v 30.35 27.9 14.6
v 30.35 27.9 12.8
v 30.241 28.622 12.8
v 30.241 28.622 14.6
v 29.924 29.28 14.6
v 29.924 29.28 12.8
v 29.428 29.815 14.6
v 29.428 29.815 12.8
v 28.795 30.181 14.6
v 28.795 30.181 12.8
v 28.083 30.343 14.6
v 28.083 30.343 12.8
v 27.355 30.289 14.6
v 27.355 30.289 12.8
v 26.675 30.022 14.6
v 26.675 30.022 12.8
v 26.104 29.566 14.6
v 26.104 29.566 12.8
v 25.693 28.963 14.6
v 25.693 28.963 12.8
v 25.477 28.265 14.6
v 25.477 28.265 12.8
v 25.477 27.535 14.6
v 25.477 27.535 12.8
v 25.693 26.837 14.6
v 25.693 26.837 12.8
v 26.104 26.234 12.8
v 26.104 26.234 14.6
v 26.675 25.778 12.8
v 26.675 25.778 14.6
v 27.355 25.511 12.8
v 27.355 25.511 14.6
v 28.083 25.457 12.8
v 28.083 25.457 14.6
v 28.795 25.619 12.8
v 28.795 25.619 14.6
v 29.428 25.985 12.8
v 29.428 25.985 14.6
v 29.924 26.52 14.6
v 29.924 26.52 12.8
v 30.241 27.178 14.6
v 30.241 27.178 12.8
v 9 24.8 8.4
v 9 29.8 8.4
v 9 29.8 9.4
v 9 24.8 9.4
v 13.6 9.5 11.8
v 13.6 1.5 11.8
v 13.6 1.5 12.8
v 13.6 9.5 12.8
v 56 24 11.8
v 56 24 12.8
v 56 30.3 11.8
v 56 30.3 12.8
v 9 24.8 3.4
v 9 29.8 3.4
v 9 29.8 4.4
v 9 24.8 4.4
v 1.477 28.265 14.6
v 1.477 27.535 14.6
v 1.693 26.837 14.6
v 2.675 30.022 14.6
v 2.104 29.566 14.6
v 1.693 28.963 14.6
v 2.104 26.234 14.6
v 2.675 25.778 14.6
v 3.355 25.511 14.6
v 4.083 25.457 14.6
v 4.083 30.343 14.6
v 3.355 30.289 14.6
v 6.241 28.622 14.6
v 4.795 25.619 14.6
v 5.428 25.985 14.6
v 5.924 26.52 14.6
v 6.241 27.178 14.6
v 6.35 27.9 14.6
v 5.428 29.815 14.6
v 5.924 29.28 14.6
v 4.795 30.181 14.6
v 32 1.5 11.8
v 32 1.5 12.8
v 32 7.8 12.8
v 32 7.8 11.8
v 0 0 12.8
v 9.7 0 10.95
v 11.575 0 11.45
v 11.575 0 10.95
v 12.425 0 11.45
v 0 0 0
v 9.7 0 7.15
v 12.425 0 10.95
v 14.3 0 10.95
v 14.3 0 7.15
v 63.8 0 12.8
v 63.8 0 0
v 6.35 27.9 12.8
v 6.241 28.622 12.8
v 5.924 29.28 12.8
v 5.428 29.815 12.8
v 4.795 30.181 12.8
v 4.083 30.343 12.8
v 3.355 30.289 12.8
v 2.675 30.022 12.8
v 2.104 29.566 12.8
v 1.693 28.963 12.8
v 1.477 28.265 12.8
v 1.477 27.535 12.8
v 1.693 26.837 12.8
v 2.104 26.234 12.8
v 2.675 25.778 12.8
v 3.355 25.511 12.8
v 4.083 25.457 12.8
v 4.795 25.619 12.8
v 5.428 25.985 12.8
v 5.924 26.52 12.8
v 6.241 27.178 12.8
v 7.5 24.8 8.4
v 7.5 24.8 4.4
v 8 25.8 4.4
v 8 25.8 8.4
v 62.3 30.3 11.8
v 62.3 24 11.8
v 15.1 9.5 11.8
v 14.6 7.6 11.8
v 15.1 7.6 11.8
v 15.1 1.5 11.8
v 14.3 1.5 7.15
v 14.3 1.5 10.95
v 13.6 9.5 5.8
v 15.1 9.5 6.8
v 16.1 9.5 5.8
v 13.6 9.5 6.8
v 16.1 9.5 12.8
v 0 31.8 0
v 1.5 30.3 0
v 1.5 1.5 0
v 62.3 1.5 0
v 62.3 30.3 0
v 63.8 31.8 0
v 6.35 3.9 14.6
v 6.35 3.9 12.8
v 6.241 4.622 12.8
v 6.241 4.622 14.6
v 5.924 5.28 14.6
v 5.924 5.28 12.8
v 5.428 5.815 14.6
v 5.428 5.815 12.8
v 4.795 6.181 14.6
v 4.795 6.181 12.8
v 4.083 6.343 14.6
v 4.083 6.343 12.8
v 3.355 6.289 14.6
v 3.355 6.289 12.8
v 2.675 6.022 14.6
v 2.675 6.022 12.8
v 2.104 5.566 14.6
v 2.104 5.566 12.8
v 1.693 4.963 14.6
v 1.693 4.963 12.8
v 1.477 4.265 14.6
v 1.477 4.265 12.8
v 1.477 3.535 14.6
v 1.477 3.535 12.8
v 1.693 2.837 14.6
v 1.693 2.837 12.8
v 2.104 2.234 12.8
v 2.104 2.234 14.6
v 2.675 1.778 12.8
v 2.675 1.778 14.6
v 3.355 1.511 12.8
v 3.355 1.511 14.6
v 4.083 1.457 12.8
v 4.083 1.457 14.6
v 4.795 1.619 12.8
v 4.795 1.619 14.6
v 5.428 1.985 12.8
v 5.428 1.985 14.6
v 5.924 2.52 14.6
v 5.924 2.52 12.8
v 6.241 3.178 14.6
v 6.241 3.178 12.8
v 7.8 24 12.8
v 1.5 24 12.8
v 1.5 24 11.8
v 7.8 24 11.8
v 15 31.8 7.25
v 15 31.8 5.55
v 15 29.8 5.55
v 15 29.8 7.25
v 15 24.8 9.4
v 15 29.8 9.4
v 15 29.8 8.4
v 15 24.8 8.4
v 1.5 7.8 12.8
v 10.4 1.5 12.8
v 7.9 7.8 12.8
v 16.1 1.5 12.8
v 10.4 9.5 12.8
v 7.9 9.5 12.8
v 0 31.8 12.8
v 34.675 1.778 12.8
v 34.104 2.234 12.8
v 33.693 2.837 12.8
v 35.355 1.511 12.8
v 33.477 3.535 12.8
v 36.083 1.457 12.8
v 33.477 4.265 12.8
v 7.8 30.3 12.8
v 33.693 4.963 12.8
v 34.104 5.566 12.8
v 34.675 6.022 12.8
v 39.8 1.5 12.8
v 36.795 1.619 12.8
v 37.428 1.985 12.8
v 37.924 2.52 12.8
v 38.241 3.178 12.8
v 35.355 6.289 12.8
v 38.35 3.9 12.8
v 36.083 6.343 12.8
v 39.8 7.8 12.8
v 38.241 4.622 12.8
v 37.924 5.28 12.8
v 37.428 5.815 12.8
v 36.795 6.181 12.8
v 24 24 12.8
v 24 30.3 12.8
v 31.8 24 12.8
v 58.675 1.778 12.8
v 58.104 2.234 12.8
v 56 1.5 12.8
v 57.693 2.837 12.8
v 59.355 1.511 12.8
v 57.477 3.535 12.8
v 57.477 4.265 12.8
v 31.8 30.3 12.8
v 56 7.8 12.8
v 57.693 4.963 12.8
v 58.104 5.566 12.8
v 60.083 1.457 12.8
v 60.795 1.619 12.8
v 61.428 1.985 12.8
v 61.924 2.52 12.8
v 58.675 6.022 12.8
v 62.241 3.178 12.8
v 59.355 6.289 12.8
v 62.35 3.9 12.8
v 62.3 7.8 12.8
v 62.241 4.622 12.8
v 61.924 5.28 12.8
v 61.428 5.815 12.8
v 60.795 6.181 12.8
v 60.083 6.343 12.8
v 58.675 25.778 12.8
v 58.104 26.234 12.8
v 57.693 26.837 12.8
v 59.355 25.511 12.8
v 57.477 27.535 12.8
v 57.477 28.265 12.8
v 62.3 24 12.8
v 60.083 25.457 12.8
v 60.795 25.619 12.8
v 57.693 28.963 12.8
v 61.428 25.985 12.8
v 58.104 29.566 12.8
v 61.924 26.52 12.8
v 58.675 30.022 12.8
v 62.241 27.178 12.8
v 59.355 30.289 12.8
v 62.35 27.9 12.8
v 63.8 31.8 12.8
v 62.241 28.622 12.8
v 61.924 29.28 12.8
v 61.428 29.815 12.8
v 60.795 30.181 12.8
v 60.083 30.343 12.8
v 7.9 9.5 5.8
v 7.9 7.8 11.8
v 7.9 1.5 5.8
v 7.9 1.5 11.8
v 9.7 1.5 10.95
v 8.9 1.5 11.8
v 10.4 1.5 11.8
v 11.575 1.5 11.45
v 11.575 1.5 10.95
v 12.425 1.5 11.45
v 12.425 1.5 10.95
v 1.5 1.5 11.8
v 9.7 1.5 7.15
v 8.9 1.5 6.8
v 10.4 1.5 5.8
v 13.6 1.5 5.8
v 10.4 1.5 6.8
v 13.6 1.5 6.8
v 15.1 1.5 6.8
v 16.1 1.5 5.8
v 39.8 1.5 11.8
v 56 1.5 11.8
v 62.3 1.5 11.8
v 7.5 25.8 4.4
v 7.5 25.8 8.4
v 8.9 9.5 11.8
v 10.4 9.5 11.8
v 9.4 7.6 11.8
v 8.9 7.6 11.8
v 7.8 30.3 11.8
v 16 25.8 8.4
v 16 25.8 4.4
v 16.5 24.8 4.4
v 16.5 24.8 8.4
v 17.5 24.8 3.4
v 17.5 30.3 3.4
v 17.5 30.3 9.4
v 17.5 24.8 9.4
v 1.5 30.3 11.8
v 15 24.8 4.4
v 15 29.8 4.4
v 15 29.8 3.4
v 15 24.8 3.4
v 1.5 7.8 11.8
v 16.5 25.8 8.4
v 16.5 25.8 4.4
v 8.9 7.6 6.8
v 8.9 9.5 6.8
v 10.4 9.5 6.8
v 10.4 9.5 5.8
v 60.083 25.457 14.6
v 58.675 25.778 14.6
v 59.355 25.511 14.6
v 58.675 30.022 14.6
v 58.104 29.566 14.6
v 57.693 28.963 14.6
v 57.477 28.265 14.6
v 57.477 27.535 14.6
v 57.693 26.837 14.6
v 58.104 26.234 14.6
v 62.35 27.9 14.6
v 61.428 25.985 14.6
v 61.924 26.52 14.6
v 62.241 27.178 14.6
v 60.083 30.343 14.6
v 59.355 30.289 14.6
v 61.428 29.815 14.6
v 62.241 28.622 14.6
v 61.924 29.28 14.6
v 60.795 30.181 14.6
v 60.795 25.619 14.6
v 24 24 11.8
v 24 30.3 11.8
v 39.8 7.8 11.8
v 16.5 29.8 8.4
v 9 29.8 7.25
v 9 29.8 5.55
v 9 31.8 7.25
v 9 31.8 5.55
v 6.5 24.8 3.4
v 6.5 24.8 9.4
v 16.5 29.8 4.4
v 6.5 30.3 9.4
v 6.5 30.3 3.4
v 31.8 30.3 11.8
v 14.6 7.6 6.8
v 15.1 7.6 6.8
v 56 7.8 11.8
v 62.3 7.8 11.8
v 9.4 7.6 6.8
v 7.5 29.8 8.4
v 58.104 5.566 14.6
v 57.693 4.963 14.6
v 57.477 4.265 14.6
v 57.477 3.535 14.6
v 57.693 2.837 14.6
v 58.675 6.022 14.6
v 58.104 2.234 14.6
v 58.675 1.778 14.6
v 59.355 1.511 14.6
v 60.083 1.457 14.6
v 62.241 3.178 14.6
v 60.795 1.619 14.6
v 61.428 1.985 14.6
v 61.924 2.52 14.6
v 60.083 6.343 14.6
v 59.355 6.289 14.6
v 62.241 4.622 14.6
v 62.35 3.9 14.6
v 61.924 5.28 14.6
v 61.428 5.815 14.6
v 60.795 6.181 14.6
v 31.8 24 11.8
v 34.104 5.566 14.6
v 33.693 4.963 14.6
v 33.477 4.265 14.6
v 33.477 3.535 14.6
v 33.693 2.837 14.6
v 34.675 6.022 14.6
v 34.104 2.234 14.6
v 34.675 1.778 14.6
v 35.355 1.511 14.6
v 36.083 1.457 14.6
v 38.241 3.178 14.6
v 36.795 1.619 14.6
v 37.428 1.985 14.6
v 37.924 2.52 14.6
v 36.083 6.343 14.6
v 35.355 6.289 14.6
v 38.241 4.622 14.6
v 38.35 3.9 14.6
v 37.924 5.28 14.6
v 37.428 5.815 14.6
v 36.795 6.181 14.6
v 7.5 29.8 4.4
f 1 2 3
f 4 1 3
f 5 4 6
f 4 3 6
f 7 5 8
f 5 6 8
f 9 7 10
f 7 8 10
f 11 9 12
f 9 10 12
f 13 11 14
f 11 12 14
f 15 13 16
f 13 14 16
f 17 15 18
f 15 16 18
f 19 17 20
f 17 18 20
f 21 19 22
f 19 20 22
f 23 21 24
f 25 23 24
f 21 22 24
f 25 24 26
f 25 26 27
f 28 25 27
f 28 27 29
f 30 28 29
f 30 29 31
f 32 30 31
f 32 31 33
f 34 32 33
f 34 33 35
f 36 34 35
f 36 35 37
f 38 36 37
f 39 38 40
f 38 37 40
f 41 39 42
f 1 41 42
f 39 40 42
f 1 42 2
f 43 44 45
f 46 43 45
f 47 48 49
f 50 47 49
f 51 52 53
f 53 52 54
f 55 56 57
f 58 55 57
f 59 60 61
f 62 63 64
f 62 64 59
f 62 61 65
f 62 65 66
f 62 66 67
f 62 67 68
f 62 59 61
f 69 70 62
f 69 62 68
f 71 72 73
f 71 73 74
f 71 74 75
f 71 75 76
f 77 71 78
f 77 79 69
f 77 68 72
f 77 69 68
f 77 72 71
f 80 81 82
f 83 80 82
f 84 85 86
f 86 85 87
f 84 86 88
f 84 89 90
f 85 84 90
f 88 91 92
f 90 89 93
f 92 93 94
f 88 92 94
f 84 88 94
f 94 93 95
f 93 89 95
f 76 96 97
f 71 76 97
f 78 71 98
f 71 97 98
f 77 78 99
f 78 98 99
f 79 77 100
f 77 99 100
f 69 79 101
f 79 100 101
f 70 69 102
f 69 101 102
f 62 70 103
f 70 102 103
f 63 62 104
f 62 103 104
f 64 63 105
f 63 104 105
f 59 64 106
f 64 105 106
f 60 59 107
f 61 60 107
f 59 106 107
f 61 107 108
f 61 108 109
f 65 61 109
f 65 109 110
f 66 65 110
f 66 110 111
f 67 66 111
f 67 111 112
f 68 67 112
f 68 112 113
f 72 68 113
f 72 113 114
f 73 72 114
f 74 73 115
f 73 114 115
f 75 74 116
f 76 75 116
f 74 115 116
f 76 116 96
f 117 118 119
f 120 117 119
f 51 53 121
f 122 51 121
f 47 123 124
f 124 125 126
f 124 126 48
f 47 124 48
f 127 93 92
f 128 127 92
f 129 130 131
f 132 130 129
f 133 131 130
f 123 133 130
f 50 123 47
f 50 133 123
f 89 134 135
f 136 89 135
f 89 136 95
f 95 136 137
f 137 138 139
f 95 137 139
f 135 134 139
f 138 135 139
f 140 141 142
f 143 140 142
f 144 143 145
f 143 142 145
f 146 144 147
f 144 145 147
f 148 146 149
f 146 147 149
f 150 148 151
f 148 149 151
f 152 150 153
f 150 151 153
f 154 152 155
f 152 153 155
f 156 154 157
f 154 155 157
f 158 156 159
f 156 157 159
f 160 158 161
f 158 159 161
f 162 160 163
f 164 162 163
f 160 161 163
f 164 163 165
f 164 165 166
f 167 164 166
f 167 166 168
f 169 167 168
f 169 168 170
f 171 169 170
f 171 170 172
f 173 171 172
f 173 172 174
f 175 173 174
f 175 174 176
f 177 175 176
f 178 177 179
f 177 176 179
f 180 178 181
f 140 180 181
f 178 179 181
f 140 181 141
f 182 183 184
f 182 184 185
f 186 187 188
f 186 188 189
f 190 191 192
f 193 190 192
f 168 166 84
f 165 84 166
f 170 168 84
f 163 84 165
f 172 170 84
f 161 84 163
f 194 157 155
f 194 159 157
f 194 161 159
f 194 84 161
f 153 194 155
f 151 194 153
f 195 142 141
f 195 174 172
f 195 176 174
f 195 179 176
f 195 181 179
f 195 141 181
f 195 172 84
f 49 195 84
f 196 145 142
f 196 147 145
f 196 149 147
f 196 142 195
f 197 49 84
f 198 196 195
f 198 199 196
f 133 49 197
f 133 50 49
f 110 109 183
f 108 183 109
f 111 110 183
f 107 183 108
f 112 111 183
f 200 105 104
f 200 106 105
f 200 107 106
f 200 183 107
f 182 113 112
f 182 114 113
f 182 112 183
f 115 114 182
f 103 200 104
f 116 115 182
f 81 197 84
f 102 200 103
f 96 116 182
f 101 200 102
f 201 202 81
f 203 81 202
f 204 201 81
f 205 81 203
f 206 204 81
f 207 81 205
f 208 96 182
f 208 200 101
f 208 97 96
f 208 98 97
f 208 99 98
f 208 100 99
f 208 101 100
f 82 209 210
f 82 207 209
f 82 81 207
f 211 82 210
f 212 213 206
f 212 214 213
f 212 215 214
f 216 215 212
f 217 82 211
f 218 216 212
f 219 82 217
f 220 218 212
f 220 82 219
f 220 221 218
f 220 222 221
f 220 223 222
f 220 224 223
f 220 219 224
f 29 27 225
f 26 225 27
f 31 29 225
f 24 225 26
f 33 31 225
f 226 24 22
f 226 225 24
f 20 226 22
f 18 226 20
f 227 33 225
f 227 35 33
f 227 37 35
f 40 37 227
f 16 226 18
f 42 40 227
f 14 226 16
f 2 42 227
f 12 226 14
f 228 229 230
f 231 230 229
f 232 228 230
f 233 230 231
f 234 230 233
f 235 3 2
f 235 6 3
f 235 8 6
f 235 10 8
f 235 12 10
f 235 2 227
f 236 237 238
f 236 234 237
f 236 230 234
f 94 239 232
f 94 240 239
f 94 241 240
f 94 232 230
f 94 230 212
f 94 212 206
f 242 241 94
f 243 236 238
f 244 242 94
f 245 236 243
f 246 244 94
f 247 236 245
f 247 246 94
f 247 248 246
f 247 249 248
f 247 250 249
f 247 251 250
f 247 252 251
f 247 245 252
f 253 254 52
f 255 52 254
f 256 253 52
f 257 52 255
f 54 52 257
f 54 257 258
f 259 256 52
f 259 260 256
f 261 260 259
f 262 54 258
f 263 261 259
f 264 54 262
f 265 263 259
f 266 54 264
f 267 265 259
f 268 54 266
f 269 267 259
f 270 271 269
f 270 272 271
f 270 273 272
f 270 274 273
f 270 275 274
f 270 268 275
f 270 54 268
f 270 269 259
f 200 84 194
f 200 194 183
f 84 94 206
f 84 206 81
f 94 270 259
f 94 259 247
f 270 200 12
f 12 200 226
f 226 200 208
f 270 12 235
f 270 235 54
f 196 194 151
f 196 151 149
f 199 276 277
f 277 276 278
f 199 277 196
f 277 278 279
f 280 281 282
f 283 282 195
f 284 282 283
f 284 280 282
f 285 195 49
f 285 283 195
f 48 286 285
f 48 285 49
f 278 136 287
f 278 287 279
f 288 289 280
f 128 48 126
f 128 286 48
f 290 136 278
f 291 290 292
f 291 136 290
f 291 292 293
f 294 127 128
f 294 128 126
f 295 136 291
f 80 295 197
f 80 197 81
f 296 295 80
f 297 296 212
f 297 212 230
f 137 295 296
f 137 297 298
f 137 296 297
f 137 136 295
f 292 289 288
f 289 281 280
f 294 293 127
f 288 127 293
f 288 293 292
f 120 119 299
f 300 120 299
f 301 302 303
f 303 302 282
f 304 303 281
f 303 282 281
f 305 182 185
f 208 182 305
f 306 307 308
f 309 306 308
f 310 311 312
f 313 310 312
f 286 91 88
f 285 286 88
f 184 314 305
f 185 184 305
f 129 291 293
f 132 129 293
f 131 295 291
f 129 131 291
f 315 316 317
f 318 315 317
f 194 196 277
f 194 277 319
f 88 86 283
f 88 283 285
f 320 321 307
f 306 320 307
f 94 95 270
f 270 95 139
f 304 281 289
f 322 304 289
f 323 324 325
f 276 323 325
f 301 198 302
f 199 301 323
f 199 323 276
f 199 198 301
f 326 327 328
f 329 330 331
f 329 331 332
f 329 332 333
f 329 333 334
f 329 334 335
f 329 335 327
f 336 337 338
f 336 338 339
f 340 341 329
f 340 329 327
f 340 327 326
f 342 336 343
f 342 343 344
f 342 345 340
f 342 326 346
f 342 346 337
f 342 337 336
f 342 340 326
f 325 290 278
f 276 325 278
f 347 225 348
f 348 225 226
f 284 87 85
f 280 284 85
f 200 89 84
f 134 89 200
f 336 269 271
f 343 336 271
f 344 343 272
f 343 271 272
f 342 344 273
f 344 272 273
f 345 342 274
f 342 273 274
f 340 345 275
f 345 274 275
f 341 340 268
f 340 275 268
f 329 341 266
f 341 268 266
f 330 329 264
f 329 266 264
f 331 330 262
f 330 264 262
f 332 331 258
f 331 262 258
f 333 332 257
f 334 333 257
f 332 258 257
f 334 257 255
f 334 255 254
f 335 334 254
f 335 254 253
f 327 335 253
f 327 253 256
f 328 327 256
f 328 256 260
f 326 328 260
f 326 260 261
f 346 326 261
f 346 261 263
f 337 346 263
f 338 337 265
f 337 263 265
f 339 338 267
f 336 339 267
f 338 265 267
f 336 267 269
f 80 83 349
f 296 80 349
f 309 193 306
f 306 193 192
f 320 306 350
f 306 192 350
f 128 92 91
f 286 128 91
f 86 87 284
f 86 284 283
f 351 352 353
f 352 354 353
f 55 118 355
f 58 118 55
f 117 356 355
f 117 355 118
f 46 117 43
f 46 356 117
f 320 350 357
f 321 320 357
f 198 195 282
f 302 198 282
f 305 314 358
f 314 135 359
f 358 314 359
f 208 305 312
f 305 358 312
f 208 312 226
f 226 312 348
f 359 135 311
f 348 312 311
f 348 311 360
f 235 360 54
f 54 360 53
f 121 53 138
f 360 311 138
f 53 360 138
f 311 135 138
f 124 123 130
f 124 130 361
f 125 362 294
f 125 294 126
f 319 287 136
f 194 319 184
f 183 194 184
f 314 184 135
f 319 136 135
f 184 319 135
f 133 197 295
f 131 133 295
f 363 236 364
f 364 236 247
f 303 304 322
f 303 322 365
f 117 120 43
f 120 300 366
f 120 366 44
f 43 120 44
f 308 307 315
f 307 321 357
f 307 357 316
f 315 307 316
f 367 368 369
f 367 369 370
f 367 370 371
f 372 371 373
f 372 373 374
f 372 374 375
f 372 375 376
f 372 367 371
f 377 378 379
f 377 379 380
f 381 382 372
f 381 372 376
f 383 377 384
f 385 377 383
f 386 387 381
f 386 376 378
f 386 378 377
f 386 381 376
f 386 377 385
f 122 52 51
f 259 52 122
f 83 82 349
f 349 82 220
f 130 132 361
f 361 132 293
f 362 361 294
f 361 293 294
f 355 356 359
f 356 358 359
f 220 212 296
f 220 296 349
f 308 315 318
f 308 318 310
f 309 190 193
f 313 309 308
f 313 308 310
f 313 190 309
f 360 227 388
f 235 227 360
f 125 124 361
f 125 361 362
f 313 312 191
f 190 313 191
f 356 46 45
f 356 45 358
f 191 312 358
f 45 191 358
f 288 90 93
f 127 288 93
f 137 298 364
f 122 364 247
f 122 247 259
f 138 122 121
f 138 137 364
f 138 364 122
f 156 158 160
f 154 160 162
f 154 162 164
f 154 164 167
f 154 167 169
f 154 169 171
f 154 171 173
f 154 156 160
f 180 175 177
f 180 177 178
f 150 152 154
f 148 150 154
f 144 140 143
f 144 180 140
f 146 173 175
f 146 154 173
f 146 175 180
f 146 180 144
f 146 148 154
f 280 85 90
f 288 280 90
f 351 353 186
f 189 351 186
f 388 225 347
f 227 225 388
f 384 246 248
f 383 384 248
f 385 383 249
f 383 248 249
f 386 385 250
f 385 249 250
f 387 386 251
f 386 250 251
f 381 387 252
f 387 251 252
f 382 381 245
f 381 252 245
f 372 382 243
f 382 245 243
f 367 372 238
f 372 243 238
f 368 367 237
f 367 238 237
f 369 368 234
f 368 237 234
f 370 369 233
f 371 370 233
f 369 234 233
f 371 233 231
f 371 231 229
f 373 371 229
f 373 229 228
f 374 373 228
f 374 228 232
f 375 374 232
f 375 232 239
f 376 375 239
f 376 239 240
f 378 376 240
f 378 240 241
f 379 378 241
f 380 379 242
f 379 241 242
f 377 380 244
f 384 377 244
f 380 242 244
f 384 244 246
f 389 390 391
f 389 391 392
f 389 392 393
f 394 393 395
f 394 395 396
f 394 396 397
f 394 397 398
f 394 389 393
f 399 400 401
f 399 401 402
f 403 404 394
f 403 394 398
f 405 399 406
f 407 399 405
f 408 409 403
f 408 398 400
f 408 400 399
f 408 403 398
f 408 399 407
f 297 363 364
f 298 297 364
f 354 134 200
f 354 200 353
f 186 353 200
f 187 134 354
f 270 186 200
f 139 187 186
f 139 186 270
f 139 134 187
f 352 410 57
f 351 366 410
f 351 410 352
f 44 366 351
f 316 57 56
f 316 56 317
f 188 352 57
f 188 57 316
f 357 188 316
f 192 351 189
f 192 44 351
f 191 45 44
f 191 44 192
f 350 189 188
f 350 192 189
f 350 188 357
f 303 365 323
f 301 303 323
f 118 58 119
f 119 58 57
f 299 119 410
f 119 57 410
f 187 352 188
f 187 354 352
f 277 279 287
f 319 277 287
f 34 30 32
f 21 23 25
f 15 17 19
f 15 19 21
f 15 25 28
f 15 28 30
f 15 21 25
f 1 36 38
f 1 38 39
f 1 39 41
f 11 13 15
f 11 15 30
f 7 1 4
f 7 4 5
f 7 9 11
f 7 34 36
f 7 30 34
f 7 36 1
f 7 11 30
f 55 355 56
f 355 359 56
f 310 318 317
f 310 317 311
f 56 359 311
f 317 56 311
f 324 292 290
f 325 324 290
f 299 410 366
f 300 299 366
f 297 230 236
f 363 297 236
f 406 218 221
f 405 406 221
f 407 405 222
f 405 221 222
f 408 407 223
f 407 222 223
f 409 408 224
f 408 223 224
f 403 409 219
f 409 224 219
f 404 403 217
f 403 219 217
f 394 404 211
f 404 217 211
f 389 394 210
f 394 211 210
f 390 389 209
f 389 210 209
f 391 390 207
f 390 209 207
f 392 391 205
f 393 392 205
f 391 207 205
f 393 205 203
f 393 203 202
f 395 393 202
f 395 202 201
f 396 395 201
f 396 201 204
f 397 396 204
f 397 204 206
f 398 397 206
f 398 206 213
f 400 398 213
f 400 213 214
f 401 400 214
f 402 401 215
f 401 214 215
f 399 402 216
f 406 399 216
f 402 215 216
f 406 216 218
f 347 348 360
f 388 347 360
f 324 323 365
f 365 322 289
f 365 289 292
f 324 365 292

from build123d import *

# Parameters (mm, degrees)
F0_W      = 63.8
F0_H      = 31.8
F0_W_2    = 60.8
F0_H_2    = 28.8
F1_DEPTH  = 12.8
F2_W      = 6.3
F2_H      = 6.3
F2_W_2    = 7.8
F3_DEPTH  = 1
F4_R      = 2.45
F5_DEPTH  = 1.8
F6_W      = 0.85
F6_H      = 0.5
F7_DEPTH  = 25.4
F9_DEPTH  = 8
F11_DEPTH = 5
F12_W     = 0.1
F12_H     = 1
F13_DEPTH = 6.3
F14_W     = 6
F14_H     = 1.7
F15_DEPTH = 2.54
F16_W     = 11
F16_H     = 6
F16_W_2   = 6
F16_H_2   = 1.7
F17_DEPTH = 0.5
F19_DEPTH = 5
F21_DEPTH = 4


# Not quite as in the source:
# - a feature names something its author has since deleted; it is built from what else it names


with BuildPart() as f1:
    # F0 (on Top) → F1 (new body)
    with BuildSketch(Plane.XY):
        with Locations((31.9, 15.9)):
            Rectangle(F0_W, F0_H)
        with Locations((31.9, 15.9)):
            Rectangle(F0_W_2, F0_H_2, mode=Mode.SUBTRACT)
    extrude(amount=F1_DEPTH)

    # F2 (on face) → F3 (join)
    with BuildSketch(Plane.XY.offset(12.8)):
        with Locations((4.65, 27.15)):
            Rectangle(F2_W, F2_H)
        with Locations((4.65, 4.65)):
            Rectangle(F2_W, F2_H)
        with Locations((59.15, 4.65)):
            Rectangle(F2_W, F2_H)
        with Locations((59.15, 27.15)):
            Rectangle(F2_W, F2_H)
        with Locations((27.9, 27.15)):
            Rectangle(F2_W_2, F2_H)
        with Locations((35.9, 4.65)):
            Rectangle(F2_W_2, F2_H)
    extrude(amount=-F3_DEPTH)

    # F4 (on face) → F5 (join)
    with BuildSketch(Plane.XY.offset(12.8)):
        with Locations((3.9, 27.9)):
            Circle(F4_R)
        with Locations((59.9, 27.9)):
            Circle(F4_R)
        with Locations((59.9, 3.9)):
            Circle(F4_R)
        with Locations((3.9, 3.9)):
            Circle(F4_R)
        with Locations((27.9, 27.9)):
            Circle(F4_R)
        with Locations((35.9, 3.9)):
            Circle(F4_R)
    extrude(amount=F5_DEPTH)

    # F6 (on face) → F7 (cut)
    with BuildSketch(Plane.XZ):
        Polygon((11.575, 10.95), (9.7, 10.95), (9.7, 7.15), (14.3, 7.15), (14.3, 10.95), (12.425, 10.95), align=None)
        with Locations((12, 11.2)):
            Rectangle(F6_W, F6_H)
    extrude(amount=-F7_DEPTH, mode=Mode.SUBTRACT)

    # F8 (on face) → F9 (join)
    with BuildSketch(Plane(origin=(0, 1.5, 0), x_dir=(-1, 0, 0), z_dir=(0, 1, 0))):
        Polygon((-13.6, 5.8), (-13.6, 6.8), (-15.1, 6.8), (-15.1, 11.8), (-13.6, 11.8), (-13.6, 12.8), (-16.1, 12.8), (-16.1, 5.8), align=None)
        Polygon((-8.9, 6.8), (-10.4, 6.8), (-10.4, 5.8), (-7.9, 5.8), (-7.9, 12.8), (-10.4, 12.8), (-10.4, 11.8), (-8.9, 11.8), align=None)
    extrude(amount=F9_DEPTH)

    # F10 (on face) → F11 (join, through all)
    with BuildSketch(Plane.XY.offset(6.8)):
        Polygon((14.6, 7.6), (15.1, 7.6), (15.1, 9.5), align=None)
        Polygon((9.4, 7.6), (8.9, 9.5), (8.9, 7.6), align=None)
    extrude(amount=F11_DEPTH)

    # F12 (on face) → F13 (join, through all)
    with BuildSketch(Plane(origin=(0, 1.5, 0), x_dir=(-1, 0, 0), z_dir=(0, 1, 0))):
        with Locations((-7.85, 12.3)):
            Rectangle(F12_W, F12_H)
    extrude(amount=F13_DEPTH)

    # F14 (on face) → F15 (cut)
    with BuildSketch(Plane(origin=(0, 31.8, 0), x_dir=(-1, 0, 0), z_dir=(0, 1, 0))):
        with Locations((-12, 6.4)):
            Rectangle(F14_W, F14_H)
    extrude(amount=-F15_DEPTH, mode=Mode.SUBTRACT)

    # F16 (on face) → F17 (join)
    with BuildSketch(Plane.XZ.offset(-30.3)):
        with Locations((12, 6.4)):
            Rectangle(F16_W, F16_H)
        with Locations((12, 6.4)):
            Rectangle(F16_W_2, F16_H_2, mode=Mode.SUBTRACT)
    extrude(amount=F17_DEPTH)

    # F18 (on face) → F19 (join)
    with BuildSketch(Plane.XZ.offset(-29.8)):
        Polygon((9, 9.4), (6.5, 9.4), (6.5, 3.4), (9, 3.4), (9, 4.4), (7.5, 4.4), (7.5, 8.4), (9, 8.4), align=None)
        Polygon((17.5, 9.4), (15, 9.4), (15, 8.4), (16.5, 8.4), (16.5, 4.4), (15, 4.4), (15, 3.4), (17.5, 3.4), align=None)
    extrude(amount=F19_DEPTH)

    # F20 (on face) → F21 (join, through all)
    with BuildSketch(Plane.XY.offset(4.4)):
        Polygon((7.5, 25.8), (7.5, 24.8), (8, 25.8), align=None)
        Polygon((16, 25.8), (16.5, 24.8), (16.5, 25.8), align=None)
    extrude(amount=F21_DEPTH)


solid = f1.part
